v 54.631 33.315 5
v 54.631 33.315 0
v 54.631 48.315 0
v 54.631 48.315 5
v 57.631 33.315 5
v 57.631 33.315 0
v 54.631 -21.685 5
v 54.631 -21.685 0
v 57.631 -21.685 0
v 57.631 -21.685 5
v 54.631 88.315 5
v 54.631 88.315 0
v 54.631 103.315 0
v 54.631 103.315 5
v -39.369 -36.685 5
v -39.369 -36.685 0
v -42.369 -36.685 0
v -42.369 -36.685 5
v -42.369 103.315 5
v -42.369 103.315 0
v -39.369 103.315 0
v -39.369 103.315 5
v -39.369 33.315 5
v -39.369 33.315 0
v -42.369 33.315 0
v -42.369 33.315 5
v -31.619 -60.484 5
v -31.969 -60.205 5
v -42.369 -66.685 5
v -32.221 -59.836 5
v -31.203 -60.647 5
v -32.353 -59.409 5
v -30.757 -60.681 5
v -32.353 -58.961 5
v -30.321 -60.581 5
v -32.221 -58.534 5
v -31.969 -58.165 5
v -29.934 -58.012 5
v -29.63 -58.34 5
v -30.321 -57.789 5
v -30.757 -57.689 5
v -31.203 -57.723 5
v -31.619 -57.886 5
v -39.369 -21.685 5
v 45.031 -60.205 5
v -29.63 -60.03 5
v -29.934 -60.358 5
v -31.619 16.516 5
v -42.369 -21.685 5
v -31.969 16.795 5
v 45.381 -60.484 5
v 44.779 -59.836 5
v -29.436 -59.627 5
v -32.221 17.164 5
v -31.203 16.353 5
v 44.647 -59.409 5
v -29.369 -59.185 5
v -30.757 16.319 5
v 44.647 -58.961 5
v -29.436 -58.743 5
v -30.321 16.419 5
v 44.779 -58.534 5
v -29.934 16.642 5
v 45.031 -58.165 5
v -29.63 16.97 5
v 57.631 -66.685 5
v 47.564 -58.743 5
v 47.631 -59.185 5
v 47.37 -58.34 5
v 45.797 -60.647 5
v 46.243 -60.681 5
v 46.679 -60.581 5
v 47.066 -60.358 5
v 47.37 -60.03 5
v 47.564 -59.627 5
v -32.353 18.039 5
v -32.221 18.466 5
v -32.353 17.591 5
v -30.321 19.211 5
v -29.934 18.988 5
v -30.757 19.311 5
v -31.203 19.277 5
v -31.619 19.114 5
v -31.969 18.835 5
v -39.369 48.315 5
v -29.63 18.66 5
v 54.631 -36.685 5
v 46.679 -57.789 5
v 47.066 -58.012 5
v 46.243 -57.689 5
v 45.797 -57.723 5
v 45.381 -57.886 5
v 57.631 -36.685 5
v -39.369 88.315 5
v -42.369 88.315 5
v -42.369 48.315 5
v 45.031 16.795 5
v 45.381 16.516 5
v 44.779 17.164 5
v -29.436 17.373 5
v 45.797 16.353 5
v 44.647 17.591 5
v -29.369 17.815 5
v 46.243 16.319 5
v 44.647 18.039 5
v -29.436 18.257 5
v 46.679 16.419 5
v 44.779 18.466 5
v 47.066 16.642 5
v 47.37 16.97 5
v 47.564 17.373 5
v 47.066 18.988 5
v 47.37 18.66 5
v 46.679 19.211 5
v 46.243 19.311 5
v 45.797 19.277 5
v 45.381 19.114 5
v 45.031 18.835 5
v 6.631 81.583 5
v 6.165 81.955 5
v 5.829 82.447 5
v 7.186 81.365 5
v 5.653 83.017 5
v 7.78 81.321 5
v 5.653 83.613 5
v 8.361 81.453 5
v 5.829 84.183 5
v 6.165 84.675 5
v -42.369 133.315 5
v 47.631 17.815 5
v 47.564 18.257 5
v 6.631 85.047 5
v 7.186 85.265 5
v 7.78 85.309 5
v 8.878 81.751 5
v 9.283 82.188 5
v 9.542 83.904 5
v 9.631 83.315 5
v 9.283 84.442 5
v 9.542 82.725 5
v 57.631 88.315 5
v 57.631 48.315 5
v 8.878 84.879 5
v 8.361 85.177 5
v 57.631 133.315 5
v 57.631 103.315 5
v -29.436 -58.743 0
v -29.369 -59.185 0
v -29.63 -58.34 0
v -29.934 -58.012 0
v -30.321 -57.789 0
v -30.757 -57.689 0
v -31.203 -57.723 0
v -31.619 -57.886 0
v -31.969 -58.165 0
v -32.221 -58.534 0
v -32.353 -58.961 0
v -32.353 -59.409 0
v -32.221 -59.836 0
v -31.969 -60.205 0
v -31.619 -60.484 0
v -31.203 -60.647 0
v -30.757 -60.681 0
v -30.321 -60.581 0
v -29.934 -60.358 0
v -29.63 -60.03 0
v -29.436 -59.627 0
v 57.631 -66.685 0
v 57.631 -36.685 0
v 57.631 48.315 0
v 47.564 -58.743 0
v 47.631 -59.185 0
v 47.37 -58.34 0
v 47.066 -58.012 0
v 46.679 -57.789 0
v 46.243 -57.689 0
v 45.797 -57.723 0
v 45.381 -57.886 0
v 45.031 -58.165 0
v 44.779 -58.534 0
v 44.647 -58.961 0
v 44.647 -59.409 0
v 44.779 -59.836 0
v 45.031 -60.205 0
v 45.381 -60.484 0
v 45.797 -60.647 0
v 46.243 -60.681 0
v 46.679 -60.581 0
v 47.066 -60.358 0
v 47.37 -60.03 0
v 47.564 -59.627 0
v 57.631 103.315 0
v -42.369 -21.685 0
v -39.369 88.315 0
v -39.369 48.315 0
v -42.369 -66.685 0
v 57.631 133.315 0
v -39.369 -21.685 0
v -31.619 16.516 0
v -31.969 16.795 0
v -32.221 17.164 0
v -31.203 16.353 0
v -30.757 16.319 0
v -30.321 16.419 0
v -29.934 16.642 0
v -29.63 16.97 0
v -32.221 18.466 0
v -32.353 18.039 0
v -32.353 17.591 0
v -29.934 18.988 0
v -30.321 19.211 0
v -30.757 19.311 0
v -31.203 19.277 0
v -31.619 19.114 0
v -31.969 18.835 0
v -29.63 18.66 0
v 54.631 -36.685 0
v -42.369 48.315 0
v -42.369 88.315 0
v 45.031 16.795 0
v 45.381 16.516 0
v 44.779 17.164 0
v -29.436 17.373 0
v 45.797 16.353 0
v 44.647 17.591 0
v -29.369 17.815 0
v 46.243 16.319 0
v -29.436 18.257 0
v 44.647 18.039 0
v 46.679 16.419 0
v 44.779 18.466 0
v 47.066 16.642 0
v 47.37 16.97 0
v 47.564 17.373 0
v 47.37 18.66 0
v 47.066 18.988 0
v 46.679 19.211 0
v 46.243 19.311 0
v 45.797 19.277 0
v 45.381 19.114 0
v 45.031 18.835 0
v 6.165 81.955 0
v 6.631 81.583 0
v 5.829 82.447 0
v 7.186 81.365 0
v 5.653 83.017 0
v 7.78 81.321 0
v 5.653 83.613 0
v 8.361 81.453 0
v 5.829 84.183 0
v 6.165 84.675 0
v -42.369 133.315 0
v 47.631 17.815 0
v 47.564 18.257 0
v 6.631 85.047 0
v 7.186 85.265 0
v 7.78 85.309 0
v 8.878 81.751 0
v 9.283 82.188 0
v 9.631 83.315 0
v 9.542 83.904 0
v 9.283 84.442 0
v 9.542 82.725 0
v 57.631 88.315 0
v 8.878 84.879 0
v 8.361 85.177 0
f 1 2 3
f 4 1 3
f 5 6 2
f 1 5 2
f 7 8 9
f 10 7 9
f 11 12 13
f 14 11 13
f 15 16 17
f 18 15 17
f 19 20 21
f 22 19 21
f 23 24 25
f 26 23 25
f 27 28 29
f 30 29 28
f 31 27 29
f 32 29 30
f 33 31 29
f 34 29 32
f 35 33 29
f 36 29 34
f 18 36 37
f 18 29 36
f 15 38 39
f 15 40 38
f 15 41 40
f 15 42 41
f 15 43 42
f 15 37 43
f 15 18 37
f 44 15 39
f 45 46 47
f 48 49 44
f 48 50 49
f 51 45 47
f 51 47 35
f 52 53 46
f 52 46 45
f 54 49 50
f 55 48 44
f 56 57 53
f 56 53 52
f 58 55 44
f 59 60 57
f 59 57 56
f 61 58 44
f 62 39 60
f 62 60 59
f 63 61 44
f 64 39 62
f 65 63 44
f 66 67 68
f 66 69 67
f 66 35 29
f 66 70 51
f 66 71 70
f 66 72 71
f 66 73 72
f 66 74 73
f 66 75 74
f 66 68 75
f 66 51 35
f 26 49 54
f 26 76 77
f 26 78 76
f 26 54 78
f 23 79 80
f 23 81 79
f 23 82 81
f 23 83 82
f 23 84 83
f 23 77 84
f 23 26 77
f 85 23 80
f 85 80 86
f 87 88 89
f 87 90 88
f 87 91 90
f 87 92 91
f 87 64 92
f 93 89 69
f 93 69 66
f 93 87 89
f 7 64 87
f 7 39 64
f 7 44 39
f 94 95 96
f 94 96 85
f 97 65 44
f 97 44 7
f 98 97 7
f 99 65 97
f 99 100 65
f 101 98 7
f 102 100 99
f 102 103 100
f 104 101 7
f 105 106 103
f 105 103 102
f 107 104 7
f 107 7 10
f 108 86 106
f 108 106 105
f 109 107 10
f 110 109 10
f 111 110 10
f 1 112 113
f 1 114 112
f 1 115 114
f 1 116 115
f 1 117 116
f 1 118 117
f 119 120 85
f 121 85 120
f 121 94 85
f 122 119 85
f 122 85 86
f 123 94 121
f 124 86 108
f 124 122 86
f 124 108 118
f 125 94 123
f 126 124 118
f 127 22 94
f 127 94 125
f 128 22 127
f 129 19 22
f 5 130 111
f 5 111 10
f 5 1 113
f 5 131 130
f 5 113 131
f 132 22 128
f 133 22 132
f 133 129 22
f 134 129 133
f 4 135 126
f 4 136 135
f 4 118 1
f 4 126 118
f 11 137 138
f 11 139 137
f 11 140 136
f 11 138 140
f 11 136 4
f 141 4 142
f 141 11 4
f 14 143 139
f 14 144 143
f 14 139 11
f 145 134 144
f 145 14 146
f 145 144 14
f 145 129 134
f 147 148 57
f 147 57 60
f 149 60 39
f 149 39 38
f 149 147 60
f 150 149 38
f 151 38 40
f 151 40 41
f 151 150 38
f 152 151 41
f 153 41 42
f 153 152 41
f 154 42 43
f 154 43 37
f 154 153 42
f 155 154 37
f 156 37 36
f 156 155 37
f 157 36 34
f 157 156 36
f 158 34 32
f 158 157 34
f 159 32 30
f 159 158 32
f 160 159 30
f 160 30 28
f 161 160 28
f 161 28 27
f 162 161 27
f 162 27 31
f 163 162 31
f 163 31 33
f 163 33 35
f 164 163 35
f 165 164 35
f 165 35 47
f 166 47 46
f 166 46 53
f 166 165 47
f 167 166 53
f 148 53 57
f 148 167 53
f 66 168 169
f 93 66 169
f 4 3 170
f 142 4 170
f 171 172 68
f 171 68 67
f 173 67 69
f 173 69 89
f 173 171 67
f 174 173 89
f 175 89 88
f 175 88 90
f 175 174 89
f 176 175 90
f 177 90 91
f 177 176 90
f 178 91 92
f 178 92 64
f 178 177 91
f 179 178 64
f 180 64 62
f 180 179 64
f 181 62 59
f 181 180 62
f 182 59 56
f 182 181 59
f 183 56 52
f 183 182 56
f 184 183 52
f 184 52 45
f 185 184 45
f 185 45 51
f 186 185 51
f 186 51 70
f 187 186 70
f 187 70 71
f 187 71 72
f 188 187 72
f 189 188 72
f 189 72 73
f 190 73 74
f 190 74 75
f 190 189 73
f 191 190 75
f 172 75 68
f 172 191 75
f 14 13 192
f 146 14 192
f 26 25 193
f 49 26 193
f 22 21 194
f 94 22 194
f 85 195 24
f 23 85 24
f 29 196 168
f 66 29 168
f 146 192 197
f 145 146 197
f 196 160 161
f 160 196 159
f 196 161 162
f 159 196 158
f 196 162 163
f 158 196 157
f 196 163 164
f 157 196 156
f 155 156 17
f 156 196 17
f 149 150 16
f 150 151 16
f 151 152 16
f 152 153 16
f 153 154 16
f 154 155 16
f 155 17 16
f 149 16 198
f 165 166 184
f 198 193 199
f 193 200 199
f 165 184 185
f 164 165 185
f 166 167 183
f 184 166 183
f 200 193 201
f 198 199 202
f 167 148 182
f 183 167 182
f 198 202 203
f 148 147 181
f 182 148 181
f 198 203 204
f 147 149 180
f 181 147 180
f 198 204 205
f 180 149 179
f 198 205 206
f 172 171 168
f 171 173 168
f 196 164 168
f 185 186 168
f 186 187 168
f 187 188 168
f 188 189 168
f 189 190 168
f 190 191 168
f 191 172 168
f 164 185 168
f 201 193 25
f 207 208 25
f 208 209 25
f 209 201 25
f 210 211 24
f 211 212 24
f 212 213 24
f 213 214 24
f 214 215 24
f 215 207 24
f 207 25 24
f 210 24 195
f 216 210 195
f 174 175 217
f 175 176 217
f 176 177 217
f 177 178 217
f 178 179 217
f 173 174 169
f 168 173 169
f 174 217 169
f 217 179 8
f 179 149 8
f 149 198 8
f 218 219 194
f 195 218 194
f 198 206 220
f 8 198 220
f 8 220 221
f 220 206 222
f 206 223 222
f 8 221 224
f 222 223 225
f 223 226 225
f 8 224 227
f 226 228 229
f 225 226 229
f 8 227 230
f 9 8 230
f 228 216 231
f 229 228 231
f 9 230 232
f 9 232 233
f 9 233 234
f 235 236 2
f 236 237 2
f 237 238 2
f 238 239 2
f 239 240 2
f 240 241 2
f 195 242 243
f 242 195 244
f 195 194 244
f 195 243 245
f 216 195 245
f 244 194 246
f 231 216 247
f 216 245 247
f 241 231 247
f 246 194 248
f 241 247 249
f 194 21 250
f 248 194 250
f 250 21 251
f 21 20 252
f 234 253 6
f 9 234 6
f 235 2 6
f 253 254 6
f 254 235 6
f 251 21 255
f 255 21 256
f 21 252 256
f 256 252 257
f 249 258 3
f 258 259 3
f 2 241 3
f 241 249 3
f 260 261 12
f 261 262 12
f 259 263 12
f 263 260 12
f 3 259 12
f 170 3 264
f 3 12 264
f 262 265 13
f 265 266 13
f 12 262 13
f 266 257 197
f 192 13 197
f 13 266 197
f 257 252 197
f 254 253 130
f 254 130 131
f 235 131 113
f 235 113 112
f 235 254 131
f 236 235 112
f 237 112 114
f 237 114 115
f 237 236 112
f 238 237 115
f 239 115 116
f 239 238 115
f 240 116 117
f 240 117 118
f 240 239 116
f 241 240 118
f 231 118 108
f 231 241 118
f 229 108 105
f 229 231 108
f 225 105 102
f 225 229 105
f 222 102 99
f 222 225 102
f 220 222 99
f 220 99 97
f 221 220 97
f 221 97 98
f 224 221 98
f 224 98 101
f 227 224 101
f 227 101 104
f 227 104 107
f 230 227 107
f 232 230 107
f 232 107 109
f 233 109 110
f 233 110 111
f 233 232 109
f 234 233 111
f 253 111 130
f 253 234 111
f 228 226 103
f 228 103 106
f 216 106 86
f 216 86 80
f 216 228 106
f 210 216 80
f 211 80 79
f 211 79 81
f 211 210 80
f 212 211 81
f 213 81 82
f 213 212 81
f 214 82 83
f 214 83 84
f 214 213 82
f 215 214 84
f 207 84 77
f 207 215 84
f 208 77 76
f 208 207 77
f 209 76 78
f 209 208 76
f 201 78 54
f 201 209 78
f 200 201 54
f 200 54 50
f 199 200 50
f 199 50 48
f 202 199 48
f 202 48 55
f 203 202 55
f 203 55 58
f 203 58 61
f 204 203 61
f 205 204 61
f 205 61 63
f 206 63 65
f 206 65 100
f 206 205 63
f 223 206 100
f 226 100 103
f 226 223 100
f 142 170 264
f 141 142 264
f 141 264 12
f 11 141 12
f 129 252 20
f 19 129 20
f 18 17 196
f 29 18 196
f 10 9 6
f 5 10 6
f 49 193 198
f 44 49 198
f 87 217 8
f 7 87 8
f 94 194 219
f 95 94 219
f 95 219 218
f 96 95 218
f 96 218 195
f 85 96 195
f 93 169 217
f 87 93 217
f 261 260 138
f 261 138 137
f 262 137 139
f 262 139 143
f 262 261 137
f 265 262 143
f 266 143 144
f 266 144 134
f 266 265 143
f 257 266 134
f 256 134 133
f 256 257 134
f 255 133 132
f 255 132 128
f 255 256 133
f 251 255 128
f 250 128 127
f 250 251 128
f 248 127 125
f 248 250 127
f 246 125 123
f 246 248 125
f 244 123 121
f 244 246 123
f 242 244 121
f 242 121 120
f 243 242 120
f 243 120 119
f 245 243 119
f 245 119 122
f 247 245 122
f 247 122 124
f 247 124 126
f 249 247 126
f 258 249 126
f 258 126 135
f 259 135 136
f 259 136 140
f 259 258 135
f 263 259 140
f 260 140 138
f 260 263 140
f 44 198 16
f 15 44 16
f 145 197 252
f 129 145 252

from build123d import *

# Parameters (mm, degrees)
F0_R     = 1.5
F0_R_2   = 2
F1_DEPTH = 5


with BuildPart() as f1:
    # F0 (on Top) → F1 (new body)
    with BuildSketch(Plane.XY):
        Polygon((57.630704, 133.314957), (-42.369296, 133.314957), (-42.369296, 103.314957), (-39.369296, 103.314957), (-39.369296, 88.314957), (-42.369296, 88.314957), (-42.369296, 48.314957), (-39.369296, 48.314957), (-39.369296, 33.314957), (-42.369296, 33.314957), (-42.369296, -21.685043), (-39.369296, -21.685043), (-39.369296, -36.685043), (-42.369296, -36.685043), (-42.369296, -66.685043), (57.630704, -66.685043), (57.630704, -36.685043), (54.630704, -36.685043), (54.630704, -21.685043), (57.630704, -21.685043), (57.630704, 33.314957), (54.630704, 33.314957), (54.630704, 48.314957), (57.630704, 48.314957), (57.630704, 88.314957), (54.630704, 88.314957), (54.630704, 103.314957), (57.630704, 103.314957), align=None)
        with Locations((-30.869296, -59.185043)):
            Circle(F0_R, mode=Mode.SUBTRACT)
        with Locations((-30.869296, 17.814957)):
            Circle(F0_R, mode=Mode.SUBTRACT)
        with Locations((46.130704, -59.185043)):
            Circle(F0_R, mode=Mode.SUBTRACT)
        with Locations((46.130704, 17.814957)):
            Circle(F0_R, mode=Mode.SUBTRACT)
        with Locations((7.630704, 83.314957)):
            Circle(F0_R_2, mode=Mode.SUBTRACT)
    extrude(amount=F1_DEPTH)


solid = f1.part
